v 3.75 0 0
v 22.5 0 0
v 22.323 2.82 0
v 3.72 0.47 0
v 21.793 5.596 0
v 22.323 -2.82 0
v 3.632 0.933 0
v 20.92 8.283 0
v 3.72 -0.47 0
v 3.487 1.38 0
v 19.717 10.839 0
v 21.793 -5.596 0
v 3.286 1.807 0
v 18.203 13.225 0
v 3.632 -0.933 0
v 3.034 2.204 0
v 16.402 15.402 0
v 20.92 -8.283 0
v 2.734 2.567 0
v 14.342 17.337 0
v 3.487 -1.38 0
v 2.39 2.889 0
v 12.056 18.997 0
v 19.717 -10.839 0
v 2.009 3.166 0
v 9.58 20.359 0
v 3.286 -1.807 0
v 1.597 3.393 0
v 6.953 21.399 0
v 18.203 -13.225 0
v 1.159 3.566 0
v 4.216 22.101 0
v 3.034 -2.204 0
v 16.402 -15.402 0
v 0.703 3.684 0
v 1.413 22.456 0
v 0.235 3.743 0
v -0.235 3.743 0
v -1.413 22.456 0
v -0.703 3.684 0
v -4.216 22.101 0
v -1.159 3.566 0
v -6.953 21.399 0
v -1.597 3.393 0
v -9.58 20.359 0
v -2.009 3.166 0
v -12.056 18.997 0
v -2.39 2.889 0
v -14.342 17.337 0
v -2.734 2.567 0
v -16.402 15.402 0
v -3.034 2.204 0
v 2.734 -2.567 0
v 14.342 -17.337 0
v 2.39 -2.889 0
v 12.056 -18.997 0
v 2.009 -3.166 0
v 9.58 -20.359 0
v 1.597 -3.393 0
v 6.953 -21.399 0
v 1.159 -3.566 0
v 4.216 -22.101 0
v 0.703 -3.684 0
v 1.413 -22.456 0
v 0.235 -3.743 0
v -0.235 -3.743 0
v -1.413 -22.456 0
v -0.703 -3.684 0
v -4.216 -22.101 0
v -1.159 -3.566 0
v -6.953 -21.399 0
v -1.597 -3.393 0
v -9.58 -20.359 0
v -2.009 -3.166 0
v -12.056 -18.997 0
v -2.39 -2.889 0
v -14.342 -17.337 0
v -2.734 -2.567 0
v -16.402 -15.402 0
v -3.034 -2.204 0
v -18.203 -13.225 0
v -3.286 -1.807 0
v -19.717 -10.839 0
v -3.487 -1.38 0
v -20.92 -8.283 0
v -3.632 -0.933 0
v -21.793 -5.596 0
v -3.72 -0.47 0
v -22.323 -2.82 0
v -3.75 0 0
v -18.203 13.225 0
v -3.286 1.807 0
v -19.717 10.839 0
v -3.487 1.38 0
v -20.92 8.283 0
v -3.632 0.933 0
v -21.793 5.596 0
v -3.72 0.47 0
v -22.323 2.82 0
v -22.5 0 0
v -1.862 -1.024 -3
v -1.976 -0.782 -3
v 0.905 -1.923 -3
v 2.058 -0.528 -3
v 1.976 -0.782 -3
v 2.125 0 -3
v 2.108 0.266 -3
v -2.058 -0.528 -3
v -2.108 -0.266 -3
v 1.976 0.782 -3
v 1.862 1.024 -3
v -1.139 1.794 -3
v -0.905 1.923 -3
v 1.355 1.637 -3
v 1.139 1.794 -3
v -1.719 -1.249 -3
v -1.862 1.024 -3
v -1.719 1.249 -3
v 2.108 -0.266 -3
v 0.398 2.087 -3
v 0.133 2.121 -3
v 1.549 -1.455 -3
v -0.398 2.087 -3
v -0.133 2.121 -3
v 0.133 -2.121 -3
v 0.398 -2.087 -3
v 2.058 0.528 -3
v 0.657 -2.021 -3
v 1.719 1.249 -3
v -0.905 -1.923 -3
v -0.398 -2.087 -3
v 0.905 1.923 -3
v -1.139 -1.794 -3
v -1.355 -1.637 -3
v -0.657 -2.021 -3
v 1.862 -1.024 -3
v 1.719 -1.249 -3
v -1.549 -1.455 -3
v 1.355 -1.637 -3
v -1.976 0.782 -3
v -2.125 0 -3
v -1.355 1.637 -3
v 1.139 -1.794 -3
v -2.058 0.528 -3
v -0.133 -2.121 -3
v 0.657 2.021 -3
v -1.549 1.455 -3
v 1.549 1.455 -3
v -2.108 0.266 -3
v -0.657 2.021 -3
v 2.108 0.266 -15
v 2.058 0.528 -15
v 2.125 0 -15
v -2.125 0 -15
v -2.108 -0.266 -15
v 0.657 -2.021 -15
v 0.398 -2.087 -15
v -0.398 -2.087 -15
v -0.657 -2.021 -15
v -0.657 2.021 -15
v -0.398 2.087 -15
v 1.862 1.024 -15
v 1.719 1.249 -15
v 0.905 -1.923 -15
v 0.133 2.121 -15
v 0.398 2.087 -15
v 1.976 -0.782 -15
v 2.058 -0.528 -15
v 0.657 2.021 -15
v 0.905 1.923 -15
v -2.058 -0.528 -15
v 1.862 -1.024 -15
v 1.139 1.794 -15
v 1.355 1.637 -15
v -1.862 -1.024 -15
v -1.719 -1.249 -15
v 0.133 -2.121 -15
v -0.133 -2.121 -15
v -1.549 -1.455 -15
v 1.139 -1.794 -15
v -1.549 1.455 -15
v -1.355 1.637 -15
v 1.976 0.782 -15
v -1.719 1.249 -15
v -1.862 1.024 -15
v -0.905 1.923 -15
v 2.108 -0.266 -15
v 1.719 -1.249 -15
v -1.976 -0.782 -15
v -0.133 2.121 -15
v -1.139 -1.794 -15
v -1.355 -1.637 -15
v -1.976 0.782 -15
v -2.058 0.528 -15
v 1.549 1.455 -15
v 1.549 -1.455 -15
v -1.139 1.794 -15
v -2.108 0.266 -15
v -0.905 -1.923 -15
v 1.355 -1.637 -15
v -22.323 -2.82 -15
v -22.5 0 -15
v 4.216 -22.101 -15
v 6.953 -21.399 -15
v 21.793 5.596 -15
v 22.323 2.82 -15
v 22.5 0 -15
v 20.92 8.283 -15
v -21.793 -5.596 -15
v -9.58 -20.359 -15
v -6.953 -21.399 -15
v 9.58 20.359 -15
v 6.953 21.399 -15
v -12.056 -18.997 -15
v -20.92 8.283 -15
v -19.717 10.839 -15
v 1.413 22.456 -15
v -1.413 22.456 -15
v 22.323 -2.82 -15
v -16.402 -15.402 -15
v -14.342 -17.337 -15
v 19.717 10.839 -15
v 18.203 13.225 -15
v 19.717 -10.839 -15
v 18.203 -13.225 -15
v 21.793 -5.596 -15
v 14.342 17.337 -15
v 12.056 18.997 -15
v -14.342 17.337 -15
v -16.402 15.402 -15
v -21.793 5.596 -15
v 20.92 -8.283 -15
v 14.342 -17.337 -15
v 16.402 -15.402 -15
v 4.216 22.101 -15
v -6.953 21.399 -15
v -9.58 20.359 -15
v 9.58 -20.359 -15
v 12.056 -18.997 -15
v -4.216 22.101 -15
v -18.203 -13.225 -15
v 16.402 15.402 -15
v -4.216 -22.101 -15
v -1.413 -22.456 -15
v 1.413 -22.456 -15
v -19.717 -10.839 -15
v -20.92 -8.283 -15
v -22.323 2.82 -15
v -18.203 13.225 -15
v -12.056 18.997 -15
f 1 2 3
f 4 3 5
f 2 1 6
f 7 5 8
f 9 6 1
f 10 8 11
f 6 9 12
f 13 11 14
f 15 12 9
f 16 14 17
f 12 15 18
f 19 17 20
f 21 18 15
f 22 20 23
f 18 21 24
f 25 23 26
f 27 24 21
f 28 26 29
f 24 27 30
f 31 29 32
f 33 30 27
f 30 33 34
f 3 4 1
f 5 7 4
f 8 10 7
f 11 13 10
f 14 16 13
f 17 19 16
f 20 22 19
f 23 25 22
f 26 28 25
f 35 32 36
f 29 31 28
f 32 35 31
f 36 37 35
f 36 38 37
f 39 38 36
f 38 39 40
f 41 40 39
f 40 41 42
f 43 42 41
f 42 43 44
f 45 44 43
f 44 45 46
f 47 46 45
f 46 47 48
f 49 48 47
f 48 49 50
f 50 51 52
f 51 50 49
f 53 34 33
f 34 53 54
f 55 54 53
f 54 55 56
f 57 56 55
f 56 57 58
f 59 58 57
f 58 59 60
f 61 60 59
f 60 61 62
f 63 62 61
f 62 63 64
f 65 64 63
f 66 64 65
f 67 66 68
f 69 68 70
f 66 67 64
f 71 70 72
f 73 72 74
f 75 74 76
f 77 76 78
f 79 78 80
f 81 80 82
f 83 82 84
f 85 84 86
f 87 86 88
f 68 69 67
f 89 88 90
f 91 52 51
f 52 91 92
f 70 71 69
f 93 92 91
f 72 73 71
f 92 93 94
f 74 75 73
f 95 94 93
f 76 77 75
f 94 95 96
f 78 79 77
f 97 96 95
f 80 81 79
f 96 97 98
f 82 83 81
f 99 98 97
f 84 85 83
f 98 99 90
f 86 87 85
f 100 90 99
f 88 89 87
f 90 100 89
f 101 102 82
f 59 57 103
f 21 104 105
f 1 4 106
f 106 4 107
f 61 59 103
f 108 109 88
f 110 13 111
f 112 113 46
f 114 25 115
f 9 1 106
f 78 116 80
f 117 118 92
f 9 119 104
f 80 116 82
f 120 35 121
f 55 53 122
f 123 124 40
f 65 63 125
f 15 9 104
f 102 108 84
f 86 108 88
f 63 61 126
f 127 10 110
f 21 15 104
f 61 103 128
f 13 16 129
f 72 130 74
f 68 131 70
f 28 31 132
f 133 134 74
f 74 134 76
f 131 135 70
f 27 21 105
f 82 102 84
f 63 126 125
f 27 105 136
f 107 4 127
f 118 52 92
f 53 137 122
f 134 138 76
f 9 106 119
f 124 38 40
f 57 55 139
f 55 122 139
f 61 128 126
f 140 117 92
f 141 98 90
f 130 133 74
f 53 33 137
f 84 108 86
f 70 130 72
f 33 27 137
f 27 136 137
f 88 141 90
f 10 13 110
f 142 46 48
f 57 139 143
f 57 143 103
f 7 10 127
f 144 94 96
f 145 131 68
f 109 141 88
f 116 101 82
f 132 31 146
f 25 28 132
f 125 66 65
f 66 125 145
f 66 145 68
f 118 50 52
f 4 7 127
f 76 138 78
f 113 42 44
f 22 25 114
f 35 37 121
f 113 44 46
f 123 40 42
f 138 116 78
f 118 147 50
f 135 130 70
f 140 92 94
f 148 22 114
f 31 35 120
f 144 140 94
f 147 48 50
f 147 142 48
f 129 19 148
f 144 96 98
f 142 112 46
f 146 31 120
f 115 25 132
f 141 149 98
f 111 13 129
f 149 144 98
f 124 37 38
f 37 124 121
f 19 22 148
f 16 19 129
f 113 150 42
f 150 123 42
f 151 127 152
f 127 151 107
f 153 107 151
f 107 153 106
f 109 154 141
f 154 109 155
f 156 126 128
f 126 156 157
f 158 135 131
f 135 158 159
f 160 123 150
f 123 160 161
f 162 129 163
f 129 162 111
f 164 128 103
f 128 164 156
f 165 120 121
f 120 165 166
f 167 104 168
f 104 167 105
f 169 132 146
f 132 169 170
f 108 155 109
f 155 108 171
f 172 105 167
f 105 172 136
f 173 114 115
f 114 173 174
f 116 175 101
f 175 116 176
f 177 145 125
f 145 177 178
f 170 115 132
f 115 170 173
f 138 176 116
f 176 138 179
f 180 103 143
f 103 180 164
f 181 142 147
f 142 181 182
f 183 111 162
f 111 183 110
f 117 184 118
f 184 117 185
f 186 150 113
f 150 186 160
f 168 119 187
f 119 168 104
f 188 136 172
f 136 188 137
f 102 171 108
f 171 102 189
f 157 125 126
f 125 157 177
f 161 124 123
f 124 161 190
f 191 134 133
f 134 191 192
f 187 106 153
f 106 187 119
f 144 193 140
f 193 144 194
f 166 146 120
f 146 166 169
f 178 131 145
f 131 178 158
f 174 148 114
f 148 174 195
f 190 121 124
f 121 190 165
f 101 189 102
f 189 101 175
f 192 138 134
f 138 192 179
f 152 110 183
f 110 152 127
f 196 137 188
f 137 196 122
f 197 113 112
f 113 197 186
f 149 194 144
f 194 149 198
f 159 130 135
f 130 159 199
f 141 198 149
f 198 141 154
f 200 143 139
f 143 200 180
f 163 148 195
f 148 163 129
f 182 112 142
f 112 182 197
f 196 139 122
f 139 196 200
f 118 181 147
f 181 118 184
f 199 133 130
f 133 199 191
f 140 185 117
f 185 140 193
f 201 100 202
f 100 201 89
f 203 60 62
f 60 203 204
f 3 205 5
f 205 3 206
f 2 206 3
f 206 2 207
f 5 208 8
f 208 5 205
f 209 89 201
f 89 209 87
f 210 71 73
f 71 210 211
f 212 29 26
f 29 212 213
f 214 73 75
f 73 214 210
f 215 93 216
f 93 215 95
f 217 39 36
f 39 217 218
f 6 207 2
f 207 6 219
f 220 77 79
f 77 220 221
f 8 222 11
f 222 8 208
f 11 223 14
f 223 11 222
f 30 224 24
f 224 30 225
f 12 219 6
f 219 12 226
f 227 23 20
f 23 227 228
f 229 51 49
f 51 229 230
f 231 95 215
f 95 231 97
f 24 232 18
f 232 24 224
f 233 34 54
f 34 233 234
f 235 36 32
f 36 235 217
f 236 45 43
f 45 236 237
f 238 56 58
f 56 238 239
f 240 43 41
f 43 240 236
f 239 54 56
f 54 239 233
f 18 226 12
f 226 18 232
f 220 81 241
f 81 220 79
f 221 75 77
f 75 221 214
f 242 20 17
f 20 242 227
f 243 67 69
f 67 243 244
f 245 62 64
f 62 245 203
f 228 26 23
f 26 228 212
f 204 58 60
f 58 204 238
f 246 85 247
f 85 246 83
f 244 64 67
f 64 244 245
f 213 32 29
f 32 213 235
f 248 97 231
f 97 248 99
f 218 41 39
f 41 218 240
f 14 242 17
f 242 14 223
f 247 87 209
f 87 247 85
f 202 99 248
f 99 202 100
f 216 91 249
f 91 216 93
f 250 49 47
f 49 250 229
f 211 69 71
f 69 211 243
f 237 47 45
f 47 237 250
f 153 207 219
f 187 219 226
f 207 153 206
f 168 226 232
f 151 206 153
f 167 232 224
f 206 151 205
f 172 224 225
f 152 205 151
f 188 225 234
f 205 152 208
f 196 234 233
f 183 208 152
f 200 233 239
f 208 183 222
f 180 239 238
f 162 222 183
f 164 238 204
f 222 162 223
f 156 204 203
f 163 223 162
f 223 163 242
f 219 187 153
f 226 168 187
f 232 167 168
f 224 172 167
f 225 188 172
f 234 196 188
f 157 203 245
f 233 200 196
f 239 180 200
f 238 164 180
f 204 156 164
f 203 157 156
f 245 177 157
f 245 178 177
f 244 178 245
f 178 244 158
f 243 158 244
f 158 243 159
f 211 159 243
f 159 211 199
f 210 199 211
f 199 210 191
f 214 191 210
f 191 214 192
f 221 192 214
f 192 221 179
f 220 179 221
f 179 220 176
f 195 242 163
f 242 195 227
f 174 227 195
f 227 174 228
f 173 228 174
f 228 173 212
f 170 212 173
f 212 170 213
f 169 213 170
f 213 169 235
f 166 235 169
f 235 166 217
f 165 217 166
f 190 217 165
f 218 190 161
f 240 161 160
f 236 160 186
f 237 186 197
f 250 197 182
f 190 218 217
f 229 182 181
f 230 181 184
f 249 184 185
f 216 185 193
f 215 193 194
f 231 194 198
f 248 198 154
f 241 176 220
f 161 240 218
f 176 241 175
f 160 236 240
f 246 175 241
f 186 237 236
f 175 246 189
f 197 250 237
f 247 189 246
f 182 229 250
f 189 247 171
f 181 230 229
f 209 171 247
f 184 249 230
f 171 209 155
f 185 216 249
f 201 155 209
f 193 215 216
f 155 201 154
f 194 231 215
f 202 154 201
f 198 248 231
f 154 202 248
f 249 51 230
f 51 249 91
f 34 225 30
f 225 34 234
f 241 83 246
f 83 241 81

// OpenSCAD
$fn = 50;

difference() {
	union() {
		translate(v = [0, 0, -15.0]) {
			cylinder(h = 15, r = 22.5);
		}
	}
	union() {
		translate(v = [0, 0, 0]) {
			rotate(a = [0, 0, 0]) {
				difference() {
					union() {
						translate(v = [0, 0, -18.0]) {
							cylinder(h = 18, r = 2.0);
						}
						translate(v = [0, 0, -3]) {
							cylinder(h = 3, r1 = 2.125, r2 = 3.75);
						}
						translate(v = [0, 0, -18.0]) {
							cylinder(h = 18, r = 2.125);
						}
						translate(v = [0, 0, -18.0]) {
							cylinder(h = 18, r = 2.0);
						}
					}
					union();
				}
			}
		}
	}
}
